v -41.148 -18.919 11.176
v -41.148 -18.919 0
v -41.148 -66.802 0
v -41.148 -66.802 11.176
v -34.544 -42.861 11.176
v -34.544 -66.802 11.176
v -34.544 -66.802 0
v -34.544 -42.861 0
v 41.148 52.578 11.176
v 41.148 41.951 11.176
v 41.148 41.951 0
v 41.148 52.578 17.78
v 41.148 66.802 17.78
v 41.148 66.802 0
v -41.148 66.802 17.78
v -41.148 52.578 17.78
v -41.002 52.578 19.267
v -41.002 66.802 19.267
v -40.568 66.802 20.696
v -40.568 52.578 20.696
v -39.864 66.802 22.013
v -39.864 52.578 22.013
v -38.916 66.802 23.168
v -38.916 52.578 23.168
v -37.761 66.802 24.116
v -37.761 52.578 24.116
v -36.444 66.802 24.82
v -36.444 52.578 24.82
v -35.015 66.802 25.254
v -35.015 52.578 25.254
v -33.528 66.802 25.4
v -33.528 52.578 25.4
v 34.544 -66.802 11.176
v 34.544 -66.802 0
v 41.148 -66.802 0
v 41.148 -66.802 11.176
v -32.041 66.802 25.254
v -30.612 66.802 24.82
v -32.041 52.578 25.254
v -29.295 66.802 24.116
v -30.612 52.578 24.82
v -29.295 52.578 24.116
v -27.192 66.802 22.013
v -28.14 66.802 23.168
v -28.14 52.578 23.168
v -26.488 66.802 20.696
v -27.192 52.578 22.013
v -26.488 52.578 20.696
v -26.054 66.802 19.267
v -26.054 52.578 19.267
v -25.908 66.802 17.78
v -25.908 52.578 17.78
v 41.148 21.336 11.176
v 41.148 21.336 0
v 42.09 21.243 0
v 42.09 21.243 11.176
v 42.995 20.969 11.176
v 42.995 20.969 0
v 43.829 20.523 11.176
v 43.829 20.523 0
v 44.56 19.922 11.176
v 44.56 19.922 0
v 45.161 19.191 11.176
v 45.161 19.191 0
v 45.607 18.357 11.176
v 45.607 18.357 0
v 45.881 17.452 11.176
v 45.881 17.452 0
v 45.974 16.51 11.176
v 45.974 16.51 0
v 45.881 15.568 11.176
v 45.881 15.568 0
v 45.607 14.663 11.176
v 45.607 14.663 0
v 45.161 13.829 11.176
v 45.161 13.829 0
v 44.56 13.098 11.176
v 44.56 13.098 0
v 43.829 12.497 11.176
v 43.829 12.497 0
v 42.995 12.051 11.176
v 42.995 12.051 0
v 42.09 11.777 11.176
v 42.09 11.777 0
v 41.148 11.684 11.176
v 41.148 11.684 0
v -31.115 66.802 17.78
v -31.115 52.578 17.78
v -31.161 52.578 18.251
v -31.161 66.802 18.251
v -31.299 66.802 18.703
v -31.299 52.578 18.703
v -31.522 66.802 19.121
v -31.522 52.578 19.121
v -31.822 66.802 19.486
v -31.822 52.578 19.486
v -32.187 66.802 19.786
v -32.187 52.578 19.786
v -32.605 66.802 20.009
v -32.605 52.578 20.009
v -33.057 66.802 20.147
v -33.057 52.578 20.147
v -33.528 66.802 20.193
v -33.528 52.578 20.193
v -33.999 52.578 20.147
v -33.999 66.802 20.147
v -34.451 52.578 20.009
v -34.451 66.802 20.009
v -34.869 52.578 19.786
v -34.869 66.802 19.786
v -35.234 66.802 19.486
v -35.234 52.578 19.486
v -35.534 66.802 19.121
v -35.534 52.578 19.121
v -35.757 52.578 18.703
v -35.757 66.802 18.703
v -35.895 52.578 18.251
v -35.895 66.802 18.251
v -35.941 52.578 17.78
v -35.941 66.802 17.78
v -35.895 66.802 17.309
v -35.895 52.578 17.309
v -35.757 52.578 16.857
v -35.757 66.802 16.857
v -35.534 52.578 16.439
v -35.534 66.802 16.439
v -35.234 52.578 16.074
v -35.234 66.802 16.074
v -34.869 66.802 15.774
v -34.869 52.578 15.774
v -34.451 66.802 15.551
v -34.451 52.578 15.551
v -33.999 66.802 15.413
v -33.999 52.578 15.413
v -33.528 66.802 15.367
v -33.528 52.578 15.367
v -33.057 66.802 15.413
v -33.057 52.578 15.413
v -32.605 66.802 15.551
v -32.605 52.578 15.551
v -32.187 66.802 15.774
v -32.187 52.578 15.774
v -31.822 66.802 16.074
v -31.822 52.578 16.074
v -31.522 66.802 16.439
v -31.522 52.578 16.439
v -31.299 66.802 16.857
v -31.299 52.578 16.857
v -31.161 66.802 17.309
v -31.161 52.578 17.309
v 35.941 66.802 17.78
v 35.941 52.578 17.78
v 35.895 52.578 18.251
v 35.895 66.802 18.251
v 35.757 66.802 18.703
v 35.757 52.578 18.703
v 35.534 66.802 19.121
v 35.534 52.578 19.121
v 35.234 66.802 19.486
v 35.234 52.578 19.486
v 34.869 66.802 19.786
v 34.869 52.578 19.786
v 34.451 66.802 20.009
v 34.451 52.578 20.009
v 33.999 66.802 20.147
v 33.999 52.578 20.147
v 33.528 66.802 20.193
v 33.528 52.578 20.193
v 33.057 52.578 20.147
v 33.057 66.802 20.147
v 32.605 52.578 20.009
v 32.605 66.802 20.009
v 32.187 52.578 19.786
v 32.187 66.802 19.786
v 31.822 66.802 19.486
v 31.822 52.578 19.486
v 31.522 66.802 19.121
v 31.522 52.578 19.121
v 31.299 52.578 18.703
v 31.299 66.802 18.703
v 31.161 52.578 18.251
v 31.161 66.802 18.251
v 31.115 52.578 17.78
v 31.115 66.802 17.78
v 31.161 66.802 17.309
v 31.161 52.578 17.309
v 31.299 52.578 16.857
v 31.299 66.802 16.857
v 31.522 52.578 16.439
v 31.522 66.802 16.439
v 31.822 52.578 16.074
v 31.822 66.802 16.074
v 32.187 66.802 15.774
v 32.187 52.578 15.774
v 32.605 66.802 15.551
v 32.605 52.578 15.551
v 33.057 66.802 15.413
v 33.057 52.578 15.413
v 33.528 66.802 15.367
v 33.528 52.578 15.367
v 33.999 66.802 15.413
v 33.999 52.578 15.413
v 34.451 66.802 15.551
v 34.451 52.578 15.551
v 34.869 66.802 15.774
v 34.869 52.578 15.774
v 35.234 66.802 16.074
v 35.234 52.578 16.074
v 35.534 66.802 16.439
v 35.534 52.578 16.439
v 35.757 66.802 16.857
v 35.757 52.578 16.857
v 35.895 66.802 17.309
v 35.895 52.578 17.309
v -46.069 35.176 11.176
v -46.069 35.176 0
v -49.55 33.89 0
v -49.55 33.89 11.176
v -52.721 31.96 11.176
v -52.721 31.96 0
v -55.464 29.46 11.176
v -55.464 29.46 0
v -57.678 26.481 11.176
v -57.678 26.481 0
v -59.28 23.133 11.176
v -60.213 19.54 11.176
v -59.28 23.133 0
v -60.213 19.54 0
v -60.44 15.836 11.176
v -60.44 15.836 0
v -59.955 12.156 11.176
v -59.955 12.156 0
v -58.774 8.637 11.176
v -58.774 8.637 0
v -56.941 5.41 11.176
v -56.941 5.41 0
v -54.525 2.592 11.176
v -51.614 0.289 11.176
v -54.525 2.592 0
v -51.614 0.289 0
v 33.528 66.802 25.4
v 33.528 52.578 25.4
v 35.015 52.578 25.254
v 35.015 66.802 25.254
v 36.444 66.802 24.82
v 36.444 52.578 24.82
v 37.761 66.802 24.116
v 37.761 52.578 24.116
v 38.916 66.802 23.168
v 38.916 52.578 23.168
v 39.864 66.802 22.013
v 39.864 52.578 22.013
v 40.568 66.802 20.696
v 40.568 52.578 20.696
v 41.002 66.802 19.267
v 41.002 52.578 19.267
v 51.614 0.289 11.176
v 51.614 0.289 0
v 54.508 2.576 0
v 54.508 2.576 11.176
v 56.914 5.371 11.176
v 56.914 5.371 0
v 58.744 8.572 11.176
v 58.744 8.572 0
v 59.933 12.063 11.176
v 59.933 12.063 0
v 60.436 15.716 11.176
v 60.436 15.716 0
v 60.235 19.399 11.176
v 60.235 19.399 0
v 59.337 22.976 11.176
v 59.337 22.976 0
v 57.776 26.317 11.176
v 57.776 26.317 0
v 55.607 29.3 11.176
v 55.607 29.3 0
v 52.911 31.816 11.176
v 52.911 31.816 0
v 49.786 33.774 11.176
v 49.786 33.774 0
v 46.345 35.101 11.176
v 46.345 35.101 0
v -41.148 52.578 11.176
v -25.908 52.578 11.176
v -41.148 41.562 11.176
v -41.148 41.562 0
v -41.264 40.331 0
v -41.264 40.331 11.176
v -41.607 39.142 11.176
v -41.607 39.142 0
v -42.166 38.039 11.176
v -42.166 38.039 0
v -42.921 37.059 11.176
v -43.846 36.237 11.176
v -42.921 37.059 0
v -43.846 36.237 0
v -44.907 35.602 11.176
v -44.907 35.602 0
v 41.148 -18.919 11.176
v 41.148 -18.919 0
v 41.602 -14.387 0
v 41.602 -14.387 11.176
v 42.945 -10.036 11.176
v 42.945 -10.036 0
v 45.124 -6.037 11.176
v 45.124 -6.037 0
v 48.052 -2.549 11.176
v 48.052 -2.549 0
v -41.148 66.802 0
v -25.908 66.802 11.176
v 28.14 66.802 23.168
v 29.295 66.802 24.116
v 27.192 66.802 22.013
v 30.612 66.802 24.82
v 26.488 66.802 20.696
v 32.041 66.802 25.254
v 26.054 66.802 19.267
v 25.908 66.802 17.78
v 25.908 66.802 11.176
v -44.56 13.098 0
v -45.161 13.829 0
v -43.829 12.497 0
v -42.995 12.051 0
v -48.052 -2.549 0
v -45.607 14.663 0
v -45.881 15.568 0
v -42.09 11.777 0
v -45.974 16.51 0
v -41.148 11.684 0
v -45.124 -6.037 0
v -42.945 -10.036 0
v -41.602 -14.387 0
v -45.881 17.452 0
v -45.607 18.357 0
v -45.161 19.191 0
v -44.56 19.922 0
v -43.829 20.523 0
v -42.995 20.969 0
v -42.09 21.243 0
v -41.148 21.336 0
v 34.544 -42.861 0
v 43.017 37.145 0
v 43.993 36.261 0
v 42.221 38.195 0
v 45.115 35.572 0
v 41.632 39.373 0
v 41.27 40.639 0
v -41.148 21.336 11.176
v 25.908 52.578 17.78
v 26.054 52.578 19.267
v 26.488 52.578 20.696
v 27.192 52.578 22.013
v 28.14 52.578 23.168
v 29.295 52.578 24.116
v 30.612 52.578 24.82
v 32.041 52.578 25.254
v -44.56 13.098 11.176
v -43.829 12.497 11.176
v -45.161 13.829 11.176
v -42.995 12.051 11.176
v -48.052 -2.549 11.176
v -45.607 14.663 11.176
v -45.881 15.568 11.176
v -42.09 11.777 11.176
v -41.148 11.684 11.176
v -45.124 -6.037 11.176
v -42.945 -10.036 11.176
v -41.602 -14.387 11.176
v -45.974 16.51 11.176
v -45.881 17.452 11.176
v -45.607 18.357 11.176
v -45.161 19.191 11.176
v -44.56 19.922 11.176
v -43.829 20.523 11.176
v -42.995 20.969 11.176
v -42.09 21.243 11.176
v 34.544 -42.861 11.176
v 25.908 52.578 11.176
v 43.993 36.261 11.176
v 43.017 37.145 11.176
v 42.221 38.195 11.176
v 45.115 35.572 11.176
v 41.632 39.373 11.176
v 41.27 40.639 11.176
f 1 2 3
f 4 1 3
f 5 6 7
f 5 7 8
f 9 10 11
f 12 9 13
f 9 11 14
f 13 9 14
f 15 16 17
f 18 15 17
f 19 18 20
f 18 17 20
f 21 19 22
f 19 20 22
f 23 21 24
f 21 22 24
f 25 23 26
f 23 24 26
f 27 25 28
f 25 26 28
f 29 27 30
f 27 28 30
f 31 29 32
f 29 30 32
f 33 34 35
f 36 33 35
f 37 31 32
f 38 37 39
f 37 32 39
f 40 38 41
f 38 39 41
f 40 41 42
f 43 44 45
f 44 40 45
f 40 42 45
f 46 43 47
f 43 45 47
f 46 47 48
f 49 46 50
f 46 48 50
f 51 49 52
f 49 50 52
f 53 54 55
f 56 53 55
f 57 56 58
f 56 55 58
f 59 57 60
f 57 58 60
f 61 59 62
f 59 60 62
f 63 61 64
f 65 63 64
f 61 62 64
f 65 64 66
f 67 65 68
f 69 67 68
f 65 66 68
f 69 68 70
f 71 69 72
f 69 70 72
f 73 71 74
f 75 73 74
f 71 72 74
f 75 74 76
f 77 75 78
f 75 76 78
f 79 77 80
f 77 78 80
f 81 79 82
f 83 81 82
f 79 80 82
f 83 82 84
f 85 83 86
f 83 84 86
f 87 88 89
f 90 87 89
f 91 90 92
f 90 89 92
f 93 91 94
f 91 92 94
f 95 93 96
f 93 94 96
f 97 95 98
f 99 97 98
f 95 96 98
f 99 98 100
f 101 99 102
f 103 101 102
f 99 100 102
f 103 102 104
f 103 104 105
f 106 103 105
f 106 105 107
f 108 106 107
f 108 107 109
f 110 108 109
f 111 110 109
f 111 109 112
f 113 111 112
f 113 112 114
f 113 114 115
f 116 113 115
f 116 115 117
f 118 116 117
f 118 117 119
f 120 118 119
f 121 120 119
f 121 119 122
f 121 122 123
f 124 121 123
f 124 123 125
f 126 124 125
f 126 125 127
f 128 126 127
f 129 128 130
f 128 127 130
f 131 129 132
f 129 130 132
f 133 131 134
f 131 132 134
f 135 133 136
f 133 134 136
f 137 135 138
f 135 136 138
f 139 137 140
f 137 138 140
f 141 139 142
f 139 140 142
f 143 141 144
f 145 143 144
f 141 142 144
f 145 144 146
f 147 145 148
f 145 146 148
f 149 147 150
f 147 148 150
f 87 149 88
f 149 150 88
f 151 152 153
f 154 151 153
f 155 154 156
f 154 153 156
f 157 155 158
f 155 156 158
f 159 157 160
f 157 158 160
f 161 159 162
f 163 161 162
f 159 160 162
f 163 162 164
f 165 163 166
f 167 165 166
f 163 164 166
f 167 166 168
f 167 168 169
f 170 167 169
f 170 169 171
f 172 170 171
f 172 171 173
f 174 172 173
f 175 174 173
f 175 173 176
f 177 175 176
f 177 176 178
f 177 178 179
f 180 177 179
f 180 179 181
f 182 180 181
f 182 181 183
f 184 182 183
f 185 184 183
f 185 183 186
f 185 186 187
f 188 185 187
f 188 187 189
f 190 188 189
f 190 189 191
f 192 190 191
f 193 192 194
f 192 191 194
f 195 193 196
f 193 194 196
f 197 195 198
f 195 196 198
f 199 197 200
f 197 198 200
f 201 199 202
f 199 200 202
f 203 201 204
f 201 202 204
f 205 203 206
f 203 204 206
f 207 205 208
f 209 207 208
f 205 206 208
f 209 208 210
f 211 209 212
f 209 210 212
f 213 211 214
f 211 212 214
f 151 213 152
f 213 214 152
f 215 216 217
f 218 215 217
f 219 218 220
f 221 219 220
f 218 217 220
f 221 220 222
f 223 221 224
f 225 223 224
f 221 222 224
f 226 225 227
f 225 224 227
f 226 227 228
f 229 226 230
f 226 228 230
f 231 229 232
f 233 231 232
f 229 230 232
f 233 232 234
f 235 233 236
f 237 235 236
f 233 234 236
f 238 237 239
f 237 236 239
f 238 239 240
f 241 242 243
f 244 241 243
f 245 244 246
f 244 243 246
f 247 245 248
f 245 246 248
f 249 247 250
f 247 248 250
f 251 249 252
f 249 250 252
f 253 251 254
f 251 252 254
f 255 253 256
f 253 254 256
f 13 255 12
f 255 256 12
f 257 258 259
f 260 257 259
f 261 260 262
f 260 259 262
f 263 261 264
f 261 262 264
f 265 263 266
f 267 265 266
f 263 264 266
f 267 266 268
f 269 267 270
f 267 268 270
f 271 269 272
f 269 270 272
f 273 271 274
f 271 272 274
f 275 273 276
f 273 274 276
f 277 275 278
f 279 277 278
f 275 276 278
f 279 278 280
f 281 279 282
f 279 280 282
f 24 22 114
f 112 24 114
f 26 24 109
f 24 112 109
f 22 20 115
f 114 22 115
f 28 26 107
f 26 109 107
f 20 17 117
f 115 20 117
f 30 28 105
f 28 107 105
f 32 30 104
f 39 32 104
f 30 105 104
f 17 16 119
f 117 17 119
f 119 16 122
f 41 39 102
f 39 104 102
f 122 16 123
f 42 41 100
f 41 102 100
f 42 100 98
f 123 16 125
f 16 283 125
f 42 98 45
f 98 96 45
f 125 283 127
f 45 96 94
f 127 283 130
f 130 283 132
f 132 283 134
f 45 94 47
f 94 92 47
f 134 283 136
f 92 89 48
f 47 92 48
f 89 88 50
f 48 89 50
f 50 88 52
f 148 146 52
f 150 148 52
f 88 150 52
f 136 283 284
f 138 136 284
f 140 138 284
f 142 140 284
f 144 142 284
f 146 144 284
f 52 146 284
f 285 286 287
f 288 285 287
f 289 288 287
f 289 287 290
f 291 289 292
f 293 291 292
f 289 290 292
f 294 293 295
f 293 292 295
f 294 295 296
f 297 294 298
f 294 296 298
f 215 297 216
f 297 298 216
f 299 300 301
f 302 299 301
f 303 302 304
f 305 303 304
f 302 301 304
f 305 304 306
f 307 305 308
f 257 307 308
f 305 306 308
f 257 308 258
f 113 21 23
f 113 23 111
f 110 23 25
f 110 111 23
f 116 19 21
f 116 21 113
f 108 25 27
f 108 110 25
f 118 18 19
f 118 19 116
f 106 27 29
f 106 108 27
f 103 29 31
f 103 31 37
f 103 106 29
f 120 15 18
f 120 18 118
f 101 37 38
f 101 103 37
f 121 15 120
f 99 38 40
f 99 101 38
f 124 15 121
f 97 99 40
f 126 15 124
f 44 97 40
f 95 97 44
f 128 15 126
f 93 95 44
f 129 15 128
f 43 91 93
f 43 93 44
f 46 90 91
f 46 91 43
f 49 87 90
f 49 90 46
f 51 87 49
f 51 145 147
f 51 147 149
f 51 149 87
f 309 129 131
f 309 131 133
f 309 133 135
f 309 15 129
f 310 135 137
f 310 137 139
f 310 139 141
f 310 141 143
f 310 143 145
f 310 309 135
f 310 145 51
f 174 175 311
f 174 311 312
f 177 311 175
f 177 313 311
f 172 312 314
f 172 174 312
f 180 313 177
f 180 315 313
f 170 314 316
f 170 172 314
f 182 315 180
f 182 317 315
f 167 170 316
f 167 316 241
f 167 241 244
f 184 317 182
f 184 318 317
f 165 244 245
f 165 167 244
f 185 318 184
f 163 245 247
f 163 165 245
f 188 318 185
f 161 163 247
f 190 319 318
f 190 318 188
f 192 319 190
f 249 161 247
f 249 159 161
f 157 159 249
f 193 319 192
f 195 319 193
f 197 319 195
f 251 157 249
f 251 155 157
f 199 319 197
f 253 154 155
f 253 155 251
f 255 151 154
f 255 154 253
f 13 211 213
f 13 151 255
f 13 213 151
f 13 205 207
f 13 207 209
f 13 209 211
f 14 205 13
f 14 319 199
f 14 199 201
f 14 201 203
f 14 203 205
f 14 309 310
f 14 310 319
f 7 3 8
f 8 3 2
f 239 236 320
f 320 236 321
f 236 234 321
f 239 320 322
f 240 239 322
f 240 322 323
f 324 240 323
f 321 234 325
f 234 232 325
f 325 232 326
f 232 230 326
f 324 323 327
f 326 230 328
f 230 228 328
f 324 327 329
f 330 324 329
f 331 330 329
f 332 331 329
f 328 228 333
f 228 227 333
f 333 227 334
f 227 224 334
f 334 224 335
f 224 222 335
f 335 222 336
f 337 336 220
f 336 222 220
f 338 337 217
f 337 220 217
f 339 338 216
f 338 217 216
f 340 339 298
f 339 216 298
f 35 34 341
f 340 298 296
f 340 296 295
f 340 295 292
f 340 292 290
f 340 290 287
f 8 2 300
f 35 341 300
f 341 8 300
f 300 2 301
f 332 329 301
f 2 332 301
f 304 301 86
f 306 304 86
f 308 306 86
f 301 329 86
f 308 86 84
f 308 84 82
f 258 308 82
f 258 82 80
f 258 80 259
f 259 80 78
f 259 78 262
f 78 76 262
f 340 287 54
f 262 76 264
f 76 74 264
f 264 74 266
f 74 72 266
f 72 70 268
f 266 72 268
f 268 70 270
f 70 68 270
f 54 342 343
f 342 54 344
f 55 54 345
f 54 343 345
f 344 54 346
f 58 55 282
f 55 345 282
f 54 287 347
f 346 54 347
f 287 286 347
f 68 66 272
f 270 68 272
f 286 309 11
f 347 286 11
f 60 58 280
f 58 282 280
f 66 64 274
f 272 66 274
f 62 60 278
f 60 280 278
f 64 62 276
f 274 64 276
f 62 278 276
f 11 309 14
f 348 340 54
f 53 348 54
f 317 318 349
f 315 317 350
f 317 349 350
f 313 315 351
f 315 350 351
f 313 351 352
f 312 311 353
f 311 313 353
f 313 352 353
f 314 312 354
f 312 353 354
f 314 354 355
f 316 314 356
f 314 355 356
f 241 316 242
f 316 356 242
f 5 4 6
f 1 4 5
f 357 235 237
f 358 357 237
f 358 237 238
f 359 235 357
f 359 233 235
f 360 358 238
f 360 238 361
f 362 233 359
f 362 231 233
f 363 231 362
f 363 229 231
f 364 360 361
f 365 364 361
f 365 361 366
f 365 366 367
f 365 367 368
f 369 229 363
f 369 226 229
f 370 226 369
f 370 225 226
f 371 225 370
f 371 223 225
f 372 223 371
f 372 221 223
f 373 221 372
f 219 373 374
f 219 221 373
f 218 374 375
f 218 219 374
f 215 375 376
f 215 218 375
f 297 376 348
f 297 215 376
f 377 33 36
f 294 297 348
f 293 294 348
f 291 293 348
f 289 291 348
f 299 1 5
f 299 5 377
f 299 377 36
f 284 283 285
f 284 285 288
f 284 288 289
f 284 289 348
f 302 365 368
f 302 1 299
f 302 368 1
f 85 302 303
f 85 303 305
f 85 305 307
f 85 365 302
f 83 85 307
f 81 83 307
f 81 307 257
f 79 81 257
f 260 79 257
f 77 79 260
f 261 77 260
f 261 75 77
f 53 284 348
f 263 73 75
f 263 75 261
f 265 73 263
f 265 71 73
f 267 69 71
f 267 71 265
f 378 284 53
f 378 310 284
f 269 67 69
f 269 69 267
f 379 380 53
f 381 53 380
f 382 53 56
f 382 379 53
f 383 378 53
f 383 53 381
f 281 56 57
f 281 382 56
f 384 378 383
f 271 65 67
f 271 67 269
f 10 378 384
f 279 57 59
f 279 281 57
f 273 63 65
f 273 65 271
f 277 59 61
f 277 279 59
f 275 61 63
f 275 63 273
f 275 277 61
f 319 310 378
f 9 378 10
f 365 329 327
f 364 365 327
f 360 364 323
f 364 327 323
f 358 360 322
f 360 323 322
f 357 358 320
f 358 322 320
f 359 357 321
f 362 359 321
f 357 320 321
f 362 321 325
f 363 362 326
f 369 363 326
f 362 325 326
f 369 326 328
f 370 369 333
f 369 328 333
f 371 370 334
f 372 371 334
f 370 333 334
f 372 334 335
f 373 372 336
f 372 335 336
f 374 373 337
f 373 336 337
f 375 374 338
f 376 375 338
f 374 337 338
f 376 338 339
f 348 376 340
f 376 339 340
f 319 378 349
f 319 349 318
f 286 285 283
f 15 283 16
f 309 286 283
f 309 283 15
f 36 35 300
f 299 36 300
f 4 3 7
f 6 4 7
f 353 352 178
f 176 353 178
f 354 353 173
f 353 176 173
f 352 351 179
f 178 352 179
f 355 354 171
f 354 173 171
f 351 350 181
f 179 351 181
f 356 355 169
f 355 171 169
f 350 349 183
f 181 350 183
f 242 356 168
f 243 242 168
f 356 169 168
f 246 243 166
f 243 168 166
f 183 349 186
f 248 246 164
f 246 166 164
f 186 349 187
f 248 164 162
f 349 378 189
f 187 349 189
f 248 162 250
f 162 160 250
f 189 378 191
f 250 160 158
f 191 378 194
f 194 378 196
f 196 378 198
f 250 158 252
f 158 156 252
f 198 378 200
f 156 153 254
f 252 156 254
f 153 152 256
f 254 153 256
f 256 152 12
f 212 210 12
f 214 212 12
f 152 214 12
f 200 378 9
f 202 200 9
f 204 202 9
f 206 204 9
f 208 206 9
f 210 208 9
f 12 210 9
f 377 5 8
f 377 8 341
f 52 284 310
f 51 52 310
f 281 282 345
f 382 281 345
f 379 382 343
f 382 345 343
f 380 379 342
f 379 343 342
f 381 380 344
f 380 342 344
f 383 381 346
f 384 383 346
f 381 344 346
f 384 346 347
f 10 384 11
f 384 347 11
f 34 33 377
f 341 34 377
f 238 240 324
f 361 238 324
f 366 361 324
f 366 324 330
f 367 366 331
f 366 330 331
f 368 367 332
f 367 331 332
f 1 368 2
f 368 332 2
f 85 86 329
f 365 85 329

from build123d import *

# Parameters (mm, degrees)
F1_DEPTH  = 11.176
F2_W      = 15.24
F2_H      = 14.224
F3_DEPTH  = 14.224
F4_R      = 2.413
F5_DEPTH  = 14.225
F7_DEPTH  = 14.225
F9_DEPTH  = 14.225
F10_W     = 69.088
F10_H     = 23.9414346935
F11_DEPTH = 11.177


with BuildPart() as f1:
    # F0 (on Top) → F1 (new body)
    with BuildSketch(Plane.XY):
        with BuildLine():
            Line((36.576, -66.802), (41.148, -66.802))
            Line((41.148, -66.802), (41.148, -18.9191306131))
            ThreePointArc((41.148, -18.9191306131), (43.9343121331, -7.9817335086), (51.6140240964, 0.2894341771))
            ThreePointArc((51.6140240964, 0.2894341771), (60.2346282504, 19.3987779476), (46.3452307692, 35.1012132022))
            ThreePointArc((46.3452307692, 35.1012132022), (42.5943851715, 37.6516131673), (41.148, 41.9506075399))
            Line((41.148, 41.9506075399), (41.148, 66.802))
            Line((41.148, 66.802), (36.576, 66.802))
            Line((36.576, 66.802), (-36.576, 66.802))
            Line((-36.576, 66.802), (-41.148, 66.802))
            Line((-41.148, 66.802), (-41.148, 41.5621785081))
            ThreePointArc((-41.148, 41.5621785081), (-42.5208525009, 37.5313086462), (-46.068627451, 35.1763290844))
            ThreePointArc((-46.068627451, 35.1763290844), (-60.2126563181, 19.5403952666), (-51.6140240964, 0.2894341771))
            ThreePointArc((-51.6140240964, 0.2894341771), (-43.9343121331, -7.9817335086), (-41.148, -18.9191306131))
            Line((-41.148, -18.9191306131), (-41.148, -66.802))
            Line((-41.148, -66.802), (-36.576, -66.802))
            Line((-36.576, -66.802), (36.576, -66.802))
        make_face()
        with BuildLine():
            ThreePointArc((-41.148, 11.684), (-45.974, 16.51), (-41.148, 21.336))
            Line((-41.148, 21.336), (41.148, 21.336))
            ThreePointArc((41.148, 21.336), (45.974, 16.51), (41.148, 11.684))
            Line((41.148, 11.684), (-41.148, 11.684))
        make_face(mode=Mode.SUBTRACT)
    extrude(amount=F1_DEPTH)

    # F2 (on face) → F3 (join)
    with BuildSketch(Plane.XY.offset(11.176)):
        with Locations((-33.528, 59.69)):
            Rectangle(F2_W, F2_H)
        with Locations((33.528, 59.69)):
            Rectangle(F2_W, F2_H)
    extrude(amount=F3_DEPTH)

    # F4 (on face) → F5 (cut, through all)
    with BuildSketch(Plane.XZ.offset(-52.578)):
        with Locations((-33.528, 17.78)):
            Circle(F4_R)
        with Locations((33.528, 17.78)):
            Circle(F4_R)
    extrude(amount=-F5_DEPTH, mode=Mode.SUBTRACT)

    # F6 (on face) → F7 (cut, through all)
    with BuildSketch(Plane.XZ.offset(-52.578)):
        with BuildLine():
            ThreePointArc((33.528, 25.4), (38.9161536726, 23.1681536726), (41.148, 17.78))
            Line((41.148, 17.78), (41.148, 25.4))
            Line((41.148, 25.4), (33.528, 25.4))
        make_face()
        with BuildLine():
            ThreePointArc((25.908, 17.78), (28.1398463274, 23.1681536726), (33.528, 25.4))
            Line((33.528, 25.4), (25.908, 25.4))
            Line((25.908, 25.4), (25.908, 17.78))
        make_face()
    extrude(amount=-F7_DEPTH, mode=Mode.SUBTRACT)

    # F8 (on face) → F9 (cut, through all)
    with BuildSketch(Plane.XZ.offset(-52.578)):
        with BuildLine():
            ThreePointArc((-41.148, 17.78), (-38.9161536726, 23.1681536726), (-33.528, 25.4))
            Line((-33.528, 25.4), (-41.148, 25.4))
            Line((-41.148, 25.4), (-41.148, 17.78))
        make_face()
        with BuildLine():
            ThreePointArc((-33.528, 25.4), (-28.1398463274, 23.1681536726), (-25.908, 17.78))
            Line((-25.908, 17.78), (-25.908, 25.4))
            Line((-25.908, 25.4), (-33.528, 25.4))
        make_face()
    extrude(amount=-F9_DEPTH, mode=Mode.SUBTRACT)

    # F10 (on face) → F11 (cut, through all)
    with BuildSketch(Plane.XY.offset(11.176)):
        with Locations((0, -54.8312826533)):
            Rectangle(F10_W, F10_H)
    extrude(amount=-F11_DEPTH, mode=Mode.SUBTRACT)


solid = f1.part
